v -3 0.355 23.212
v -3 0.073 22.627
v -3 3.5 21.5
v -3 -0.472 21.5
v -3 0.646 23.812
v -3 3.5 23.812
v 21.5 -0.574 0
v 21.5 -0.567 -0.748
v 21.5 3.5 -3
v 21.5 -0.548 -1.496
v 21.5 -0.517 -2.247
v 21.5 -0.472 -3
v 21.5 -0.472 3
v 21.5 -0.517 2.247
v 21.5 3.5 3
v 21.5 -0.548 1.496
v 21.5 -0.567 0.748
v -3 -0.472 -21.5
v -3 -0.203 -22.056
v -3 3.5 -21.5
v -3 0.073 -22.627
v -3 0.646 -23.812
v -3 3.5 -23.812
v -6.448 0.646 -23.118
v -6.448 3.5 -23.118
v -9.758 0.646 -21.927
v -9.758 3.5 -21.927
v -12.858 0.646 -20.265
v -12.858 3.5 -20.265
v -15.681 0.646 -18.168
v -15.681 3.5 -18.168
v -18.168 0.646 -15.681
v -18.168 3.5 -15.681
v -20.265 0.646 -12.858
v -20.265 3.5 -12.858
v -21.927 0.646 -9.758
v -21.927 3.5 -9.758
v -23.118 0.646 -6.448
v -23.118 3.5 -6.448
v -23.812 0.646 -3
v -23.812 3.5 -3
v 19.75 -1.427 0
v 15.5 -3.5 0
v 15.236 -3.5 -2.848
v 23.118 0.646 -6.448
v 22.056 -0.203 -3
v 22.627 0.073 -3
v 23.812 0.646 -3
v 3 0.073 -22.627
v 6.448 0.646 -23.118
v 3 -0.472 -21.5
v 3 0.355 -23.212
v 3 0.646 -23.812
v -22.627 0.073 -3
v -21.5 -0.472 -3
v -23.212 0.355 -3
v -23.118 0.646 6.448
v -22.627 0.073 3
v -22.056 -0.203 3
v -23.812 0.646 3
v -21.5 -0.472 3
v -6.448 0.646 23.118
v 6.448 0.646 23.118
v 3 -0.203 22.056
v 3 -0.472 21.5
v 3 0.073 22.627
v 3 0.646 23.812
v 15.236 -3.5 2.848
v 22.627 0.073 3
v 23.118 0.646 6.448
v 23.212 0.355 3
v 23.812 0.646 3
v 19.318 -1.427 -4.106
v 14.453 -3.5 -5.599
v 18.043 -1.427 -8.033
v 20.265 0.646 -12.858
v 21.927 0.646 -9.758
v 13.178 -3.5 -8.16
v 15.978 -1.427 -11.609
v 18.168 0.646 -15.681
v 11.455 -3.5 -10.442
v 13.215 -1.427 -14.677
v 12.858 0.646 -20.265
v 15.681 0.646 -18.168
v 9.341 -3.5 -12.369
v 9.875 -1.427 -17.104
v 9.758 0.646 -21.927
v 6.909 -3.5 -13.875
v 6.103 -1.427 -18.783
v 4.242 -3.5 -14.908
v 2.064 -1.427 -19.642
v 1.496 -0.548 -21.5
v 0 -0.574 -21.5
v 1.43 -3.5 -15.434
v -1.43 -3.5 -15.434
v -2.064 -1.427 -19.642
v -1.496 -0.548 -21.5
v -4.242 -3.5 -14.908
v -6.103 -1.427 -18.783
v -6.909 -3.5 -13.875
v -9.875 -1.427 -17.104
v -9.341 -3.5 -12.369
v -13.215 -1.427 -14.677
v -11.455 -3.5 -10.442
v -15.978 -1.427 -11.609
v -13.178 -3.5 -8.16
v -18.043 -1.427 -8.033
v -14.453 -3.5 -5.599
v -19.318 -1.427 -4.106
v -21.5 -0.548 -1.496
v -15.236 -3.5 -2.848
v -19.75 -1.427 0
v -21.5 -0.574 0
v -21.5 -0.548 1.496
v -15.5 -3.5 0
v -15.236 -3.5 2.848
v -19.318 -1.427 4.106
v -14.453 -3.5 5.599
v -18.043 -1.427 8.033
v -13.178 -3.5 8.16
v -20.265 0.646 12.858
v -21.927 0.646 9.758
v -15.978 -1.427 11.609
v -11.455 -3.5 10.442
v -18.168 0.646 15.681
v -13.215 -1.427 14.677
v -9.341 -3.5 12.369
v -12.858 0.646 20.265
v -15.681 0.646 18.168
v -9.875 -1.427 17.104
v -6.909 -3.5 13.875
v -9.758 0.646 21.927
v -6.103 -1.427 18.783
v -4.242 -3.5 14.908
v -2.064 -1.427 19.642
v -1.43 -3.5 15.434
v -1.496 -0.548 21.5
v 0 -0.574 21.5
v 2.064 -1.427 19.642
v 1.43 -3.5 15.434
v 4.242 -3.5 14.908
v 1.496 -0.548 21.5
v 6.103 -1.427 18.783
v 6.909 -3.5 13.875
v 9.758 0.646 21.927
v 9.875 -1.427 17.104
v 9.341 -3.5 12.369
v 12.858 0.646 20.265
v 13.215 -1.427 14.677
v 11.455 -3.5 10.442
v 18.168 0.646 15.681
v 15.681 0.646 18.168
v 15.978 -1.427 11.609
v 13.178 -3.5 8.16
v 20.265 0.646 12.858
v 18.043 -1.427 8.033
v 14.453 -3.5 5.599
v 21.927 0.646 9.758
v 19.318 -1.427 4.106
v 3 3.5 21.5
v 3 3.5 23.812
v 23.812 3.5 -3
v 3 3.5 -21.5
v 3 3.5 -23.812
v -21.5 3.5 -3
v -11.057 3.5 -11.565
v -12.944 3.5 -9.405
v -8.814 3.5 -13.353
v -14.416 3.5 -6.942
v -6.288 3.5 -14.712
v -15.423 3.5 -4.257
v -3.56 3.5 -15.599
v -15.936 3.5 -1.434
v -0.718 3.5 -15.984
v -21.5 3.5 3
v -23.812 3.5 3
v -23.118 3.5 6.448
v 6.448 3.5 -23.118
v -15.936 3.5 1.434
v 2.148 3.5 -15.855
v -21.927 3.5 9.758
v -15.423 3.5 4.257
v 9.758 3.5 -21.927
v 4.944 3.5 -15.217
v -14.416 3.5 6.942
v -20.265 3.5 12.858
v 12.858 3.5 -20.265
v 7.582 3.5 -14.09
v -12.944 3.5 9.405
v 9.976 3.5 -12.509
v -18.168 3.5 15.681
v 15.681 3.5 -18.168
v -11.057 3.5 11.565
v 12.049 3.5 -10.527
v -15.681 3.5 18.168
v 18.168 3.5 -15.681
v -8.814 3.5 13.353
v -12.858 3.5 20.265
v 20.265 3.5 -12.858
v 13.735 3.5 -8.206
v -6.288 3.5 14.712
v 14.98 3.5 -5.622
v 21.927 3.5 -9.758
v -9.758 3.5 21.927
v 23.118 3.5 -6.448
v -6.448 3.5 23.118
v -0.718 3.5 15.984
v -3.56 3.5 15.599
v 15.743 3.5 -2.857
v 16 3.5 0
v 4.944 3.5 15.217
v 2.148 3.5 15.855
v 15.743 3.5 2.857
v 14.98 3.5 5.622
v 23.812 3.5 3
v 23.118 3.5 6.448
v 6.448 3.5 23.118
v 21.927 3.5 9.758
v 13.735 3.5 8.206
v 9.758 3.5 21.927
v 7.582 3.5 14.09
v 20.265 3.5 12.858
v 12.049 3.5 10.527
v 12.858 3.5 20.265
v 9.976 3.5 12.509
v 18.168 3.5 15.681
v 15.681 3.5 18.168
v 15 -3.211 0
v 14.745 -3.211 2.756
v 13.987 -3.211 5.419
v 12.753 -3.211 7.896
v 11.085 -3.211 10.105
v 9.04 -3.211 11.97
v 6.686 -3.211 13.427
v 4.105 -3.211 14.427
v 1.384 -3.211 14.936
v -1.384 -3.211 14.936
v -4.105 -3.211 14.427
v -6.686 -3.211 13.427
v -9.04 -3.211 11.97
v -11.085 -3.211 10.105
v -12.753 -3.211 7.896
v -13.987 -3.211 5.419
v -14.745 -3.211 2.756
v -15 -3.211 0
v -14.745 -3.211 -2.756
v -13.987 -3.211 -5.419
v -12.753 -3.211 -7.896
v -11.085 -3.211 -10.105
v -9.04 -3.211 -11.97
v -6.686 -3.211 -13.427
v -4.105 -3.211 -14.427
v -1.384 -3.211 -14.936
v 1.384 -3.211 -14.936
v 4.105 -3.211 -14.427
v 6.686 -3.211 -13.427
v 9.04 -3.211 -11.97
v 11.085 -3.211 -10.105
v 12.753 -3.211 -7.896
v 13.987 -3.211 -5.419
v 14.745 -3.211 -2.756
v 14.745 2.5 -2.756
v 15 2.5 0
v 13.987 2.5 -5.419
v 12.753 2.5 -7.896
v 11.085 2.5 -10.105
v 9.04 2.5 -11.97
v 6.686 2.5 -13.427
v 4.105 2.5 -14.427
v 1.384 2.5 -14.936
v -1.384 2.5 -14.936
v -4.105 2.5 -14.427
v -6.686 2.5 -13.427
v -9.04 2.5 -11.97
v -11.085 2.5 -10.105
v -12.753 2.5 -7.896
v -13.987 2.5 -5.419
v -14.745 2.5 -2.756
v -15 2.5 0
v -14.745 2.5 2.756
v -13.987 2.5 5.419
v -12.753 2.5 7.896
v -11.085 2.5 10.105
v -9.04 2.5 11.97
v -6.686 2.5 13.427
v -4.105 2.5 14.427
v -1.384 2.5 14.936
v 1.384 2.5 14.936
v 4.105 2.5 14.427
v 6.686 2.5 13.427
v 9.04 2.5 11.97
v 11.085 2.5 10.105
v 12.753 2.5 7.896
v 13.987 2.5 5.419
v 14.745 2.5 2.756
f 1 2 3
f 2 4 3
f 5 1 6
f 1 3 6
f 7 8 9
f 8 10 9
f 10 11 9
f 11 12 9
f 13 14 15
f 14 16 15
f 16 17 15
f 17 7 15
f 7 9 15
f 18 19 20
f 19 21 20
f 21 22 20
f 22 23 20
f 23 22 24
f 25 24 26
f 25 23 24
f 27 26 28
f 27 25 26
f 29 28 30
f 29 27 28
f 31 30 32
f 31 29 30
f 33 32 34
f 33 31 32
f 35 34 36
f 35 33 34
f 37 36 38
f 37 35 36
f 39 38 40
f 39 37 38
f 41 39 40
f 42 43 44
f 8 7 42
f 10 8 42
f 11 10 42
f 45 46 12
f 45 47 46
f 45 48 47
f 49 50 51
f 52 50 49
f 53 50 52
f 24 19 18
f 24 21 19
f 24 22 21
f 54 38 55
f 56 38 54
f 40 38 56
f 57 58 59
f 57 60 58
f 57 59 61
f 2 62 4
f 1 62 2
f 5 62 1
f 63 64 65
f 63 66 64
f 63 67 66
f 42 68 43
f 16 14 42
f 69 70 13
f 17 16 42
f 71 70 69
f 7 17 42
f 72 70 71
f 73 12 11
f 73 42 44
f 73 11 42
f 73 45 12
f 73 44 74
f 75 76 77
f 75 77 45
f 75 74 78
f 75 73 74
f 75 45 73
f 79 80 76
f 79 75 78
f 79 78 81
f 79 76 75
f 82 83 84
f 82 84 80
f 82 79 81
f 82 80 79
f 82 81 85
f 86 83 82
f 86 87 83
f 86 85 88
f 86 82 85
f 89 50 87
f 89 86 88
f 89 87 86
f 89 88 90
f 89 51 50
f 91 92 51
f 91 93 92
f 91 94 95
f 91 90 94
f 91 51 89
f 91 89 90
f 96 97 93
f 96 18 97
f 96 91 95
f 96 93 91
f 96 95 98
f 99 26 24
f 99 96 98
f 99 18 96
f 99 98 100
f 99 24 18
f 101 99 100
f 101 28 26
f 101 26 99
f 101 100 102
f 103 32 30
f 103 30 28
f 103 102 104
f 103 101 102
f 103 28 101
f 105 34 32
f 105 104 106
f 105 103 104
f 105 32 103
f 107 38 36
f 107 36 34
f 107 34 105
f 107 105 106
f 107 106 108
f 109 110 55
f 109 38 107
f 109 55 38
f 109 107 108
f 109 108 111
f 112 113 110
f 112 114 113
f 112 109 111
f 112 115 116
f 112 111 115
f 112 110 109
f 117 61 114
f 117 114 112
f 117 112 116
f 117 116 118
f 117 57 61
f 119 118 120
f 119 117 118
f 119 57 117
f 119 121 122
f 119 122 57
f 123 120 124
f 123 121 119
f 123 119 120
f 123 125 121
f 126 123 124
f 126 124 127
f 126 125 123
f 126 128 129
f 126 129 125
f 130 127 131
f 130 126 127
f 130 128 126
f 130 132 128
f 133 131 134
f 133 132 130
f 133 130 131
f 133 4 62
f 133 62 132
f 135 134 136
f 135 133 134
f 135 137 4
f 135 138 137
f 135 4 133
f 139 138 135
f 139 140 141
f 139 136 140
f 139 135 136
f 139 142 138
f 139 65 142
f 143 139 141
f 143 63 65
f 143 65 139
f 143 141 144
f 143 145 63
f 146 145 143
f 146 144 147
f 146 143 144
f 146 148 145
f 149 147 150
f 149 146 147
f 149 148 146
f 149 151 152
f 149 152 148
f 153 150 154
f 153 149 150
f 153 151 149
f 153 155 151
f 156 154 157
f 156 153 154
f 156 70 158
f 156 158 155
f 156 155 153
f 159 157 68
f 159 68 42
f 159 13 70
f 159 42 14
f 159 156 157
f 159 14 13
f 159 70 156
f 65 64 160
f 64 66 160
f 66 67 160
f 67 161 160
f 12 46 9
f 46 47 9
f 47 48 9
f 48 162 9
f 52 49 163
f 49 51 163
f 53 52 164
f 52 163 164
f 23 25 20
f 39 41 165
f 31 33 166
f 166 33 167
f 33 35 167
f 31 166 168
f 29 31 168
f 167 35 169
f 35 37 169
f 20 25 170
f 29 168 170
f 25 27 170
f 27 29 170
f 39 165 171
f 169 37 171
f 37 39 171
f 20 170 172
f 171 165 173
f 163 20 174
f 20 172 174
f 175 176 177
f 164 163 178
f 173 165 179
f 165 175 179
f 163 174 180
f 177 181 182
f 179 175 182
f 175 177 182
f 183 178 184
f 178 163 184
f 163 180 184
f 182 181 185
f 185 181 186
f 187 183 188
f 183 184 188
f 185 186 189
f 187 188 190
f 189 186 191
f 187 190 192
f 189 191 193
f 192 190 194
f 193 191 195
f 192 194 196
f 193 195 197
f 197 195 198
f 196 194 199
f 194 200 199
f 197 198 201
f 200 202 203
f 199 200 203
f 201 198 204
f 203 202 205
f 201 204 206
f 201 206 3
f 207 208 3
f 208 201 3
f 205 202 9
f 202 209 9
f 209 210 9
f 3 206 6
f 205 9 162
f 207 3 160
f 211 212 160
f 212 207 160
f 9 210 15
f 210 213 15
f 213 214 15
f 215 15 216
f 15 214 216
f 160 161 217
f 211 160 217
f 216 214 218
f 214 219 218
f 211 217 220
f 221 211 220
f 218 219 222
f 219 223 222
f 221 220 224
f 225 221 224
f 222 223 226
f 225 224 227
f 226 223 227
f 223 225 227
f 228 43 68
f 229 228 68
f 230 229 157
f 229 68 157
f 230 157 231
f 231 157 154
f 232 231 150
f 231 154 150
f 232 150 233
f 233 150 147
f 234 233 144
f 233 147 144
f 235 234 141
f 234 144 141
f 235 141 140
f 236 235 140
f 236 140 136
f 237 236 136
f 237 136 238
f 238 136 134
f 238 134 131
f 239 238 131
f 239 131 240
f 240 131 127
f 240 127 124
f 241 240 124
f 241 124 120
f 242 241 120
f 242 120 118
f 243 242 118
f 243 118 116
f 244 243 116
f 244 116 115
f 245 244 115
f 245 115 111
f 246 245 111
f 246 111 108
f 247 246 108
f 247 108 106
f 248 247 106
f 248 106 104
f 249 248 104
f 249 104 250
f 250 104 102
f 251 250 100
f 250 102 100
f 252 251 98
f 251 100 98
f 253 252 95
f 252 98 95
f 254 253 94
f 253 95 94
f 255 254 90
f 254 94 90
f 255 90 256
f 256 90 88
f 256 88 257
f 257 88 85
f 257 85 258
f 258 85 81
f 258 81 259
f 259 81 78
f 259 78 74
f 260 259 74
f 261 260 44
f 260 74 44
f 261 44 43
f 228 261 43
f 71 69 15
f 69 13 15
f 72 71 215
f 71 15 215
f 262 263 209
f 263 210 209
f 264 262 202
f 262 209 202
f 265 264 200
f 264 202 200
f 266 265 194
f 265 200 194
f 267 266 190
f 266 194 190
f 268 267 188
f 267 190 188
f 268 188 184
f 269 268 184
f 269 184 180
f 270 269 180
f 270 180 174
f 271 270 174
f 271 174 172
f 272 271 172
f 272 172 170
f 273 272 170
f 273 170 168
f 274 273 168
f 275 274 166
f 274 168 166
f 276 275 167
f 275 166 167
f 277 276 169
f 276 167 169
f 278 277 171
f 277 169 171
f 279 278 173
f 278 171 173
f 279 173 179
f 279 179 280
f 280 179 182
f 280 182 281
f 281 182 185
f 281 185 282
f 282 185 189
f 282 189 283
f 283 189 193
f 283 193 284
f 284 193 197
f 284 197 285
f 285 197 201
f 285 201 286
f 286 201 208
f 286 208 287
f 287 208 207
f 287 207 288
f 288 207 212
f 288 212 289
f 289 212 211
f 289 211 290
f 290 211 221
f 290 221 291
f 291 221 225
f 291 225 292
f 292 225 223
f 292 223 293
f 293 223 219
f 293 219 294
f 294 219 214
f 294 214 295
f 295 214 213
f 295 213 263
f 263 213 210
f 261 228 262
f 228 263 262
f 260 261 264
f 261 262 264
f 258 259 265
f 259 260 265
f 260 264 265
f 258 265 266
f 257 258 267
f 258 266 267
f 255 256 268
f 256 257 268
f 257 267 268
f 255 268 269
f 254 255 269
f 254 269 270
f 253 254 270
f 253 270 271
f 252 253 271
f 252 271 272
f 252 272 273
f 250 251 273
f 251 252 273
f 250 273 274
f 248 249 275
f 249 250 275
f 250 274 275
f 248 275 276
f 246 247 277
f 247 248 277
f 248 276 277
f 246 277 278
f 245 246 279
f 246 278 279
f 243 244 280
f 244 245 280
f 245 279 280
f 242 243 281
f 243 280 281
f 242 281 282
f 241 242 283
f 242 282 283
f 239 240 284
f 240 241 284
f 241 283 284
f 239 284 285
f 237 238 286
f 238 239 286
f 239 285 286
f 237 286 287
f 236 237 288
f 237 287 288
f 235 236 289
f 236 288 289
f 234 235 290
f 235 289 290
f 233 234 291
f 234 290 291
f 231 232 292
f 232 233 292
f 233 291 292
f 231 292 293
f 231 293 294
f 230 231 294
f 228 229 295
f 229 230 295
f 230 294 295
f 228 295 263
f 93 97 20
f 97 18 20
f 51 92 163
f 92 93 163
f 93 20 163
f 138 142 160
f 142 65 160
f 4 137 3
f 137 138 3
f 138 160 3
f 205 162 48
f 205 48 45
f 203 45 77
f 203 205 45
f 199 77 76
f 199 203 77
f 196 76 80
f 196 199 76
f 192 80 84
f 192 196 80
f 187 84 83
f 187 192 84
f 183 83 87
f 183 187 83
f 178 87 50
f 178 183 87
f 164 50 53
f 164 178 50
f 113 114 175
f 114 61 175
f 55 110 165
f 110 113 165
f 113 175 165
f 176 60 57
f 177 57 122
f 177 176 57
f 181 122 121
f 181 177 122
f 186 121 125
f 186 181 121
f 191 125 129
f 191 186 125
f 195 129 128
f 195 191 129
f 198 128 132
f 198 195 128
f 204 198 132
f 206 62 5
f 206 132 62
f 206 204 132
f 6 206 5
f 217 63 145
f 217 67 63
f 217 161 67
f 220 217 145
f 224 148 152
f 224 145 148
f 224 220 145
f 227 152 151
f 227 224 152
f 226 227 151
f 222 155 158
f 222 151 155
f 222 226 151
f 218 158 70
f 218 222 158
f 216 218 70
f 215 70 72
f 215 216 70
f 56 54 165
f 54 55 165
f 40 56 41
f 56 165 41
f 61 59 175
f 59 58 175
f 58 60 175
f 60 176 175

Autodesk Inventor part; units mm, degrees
ref_plane "YZ Plane" through (0, 0, 0) normal (1, 0, 0) x (0, 1, 0)
ref_plane "XZ Plane" through (0, 0, 0) normal (0, 1, 0) x (-1, 0, 0)
ref_plane "XY Plane" through (0, 0, 0) normal (0, 0, 1) x (1, 0, 0)
sketch "Эскиз1" plane through (0, 0, 0) normal (0, 0, 1) x (1, 0, 0)
  line L0 (0, 3.5) -> (0, -3.5)
  line L1 (15, -3.2113) -> (15.5, -3.5)
  line L2 (15.5, -3.5) -> (24, 0.6457)
  line L3 (15, -3.2113) -> (15, 2.5)
  line L4 (0, -3.5) -> (15.5, -3.5) construction
  line L5 (24, 0.6457) -> (24, 3.5)
  line L6 (24, 3.5) -> (16, 3.5)
  line L7 (15, 2.5) -> (16, 3.5)
  point P0 (0, 0)
  point P1 (0, 0)
  point P2 (15, 3.5)
  dimension "d0" = 7
  dimension "d1" = 60
  dimension "d2" = 31
  dimension "d3" = 30
  dimension "d4" = 26
  dimension "d5" = 48
  dimension "d9" = 1
  dimension "d10" = 45
revolve "Вращение1" add sketch "Эскиз1" angle 360 about axis through (0, 3.5, 0) along (0, -1, 0)
sketch "Эскиз2" plane through (0, 3.5, 0) normal (0, 1, 0) x (1, 0, 0)
  circle A0 centre (0, 0) radius 24 projected
  line L0 (3, 24) -> (-3, 24)
  line L1 (-3, 24) -> (-3, 21.5)
  line L2 (-3, 21.5) -> (3, 21.5)
  line L3 (3, 21.5) -> (3, 24)
  point P0 (0, 0)
  point P1 (0, 24)
  point P2 (3, 23.8118)
  point P3 (-3, 23.8118)
  dimension "d12" = 2.5
  dimension "d13" = 6
extrude "Выдавливание1" cut sketch "Эскиз2" against normal through all contours L3 L2 L1 A0 picked at (0, 22.3333)
pattern_circular "Круговой массив1" count 4 over 360 about axis through (0, -10, 0) along (0, 1, 0) of "Выдавливание1"
thread "Резьба1" size "M30x1" class "6H" standard "ISO Metric profile" length 20
properties part number "69. Гайка стопорная"
